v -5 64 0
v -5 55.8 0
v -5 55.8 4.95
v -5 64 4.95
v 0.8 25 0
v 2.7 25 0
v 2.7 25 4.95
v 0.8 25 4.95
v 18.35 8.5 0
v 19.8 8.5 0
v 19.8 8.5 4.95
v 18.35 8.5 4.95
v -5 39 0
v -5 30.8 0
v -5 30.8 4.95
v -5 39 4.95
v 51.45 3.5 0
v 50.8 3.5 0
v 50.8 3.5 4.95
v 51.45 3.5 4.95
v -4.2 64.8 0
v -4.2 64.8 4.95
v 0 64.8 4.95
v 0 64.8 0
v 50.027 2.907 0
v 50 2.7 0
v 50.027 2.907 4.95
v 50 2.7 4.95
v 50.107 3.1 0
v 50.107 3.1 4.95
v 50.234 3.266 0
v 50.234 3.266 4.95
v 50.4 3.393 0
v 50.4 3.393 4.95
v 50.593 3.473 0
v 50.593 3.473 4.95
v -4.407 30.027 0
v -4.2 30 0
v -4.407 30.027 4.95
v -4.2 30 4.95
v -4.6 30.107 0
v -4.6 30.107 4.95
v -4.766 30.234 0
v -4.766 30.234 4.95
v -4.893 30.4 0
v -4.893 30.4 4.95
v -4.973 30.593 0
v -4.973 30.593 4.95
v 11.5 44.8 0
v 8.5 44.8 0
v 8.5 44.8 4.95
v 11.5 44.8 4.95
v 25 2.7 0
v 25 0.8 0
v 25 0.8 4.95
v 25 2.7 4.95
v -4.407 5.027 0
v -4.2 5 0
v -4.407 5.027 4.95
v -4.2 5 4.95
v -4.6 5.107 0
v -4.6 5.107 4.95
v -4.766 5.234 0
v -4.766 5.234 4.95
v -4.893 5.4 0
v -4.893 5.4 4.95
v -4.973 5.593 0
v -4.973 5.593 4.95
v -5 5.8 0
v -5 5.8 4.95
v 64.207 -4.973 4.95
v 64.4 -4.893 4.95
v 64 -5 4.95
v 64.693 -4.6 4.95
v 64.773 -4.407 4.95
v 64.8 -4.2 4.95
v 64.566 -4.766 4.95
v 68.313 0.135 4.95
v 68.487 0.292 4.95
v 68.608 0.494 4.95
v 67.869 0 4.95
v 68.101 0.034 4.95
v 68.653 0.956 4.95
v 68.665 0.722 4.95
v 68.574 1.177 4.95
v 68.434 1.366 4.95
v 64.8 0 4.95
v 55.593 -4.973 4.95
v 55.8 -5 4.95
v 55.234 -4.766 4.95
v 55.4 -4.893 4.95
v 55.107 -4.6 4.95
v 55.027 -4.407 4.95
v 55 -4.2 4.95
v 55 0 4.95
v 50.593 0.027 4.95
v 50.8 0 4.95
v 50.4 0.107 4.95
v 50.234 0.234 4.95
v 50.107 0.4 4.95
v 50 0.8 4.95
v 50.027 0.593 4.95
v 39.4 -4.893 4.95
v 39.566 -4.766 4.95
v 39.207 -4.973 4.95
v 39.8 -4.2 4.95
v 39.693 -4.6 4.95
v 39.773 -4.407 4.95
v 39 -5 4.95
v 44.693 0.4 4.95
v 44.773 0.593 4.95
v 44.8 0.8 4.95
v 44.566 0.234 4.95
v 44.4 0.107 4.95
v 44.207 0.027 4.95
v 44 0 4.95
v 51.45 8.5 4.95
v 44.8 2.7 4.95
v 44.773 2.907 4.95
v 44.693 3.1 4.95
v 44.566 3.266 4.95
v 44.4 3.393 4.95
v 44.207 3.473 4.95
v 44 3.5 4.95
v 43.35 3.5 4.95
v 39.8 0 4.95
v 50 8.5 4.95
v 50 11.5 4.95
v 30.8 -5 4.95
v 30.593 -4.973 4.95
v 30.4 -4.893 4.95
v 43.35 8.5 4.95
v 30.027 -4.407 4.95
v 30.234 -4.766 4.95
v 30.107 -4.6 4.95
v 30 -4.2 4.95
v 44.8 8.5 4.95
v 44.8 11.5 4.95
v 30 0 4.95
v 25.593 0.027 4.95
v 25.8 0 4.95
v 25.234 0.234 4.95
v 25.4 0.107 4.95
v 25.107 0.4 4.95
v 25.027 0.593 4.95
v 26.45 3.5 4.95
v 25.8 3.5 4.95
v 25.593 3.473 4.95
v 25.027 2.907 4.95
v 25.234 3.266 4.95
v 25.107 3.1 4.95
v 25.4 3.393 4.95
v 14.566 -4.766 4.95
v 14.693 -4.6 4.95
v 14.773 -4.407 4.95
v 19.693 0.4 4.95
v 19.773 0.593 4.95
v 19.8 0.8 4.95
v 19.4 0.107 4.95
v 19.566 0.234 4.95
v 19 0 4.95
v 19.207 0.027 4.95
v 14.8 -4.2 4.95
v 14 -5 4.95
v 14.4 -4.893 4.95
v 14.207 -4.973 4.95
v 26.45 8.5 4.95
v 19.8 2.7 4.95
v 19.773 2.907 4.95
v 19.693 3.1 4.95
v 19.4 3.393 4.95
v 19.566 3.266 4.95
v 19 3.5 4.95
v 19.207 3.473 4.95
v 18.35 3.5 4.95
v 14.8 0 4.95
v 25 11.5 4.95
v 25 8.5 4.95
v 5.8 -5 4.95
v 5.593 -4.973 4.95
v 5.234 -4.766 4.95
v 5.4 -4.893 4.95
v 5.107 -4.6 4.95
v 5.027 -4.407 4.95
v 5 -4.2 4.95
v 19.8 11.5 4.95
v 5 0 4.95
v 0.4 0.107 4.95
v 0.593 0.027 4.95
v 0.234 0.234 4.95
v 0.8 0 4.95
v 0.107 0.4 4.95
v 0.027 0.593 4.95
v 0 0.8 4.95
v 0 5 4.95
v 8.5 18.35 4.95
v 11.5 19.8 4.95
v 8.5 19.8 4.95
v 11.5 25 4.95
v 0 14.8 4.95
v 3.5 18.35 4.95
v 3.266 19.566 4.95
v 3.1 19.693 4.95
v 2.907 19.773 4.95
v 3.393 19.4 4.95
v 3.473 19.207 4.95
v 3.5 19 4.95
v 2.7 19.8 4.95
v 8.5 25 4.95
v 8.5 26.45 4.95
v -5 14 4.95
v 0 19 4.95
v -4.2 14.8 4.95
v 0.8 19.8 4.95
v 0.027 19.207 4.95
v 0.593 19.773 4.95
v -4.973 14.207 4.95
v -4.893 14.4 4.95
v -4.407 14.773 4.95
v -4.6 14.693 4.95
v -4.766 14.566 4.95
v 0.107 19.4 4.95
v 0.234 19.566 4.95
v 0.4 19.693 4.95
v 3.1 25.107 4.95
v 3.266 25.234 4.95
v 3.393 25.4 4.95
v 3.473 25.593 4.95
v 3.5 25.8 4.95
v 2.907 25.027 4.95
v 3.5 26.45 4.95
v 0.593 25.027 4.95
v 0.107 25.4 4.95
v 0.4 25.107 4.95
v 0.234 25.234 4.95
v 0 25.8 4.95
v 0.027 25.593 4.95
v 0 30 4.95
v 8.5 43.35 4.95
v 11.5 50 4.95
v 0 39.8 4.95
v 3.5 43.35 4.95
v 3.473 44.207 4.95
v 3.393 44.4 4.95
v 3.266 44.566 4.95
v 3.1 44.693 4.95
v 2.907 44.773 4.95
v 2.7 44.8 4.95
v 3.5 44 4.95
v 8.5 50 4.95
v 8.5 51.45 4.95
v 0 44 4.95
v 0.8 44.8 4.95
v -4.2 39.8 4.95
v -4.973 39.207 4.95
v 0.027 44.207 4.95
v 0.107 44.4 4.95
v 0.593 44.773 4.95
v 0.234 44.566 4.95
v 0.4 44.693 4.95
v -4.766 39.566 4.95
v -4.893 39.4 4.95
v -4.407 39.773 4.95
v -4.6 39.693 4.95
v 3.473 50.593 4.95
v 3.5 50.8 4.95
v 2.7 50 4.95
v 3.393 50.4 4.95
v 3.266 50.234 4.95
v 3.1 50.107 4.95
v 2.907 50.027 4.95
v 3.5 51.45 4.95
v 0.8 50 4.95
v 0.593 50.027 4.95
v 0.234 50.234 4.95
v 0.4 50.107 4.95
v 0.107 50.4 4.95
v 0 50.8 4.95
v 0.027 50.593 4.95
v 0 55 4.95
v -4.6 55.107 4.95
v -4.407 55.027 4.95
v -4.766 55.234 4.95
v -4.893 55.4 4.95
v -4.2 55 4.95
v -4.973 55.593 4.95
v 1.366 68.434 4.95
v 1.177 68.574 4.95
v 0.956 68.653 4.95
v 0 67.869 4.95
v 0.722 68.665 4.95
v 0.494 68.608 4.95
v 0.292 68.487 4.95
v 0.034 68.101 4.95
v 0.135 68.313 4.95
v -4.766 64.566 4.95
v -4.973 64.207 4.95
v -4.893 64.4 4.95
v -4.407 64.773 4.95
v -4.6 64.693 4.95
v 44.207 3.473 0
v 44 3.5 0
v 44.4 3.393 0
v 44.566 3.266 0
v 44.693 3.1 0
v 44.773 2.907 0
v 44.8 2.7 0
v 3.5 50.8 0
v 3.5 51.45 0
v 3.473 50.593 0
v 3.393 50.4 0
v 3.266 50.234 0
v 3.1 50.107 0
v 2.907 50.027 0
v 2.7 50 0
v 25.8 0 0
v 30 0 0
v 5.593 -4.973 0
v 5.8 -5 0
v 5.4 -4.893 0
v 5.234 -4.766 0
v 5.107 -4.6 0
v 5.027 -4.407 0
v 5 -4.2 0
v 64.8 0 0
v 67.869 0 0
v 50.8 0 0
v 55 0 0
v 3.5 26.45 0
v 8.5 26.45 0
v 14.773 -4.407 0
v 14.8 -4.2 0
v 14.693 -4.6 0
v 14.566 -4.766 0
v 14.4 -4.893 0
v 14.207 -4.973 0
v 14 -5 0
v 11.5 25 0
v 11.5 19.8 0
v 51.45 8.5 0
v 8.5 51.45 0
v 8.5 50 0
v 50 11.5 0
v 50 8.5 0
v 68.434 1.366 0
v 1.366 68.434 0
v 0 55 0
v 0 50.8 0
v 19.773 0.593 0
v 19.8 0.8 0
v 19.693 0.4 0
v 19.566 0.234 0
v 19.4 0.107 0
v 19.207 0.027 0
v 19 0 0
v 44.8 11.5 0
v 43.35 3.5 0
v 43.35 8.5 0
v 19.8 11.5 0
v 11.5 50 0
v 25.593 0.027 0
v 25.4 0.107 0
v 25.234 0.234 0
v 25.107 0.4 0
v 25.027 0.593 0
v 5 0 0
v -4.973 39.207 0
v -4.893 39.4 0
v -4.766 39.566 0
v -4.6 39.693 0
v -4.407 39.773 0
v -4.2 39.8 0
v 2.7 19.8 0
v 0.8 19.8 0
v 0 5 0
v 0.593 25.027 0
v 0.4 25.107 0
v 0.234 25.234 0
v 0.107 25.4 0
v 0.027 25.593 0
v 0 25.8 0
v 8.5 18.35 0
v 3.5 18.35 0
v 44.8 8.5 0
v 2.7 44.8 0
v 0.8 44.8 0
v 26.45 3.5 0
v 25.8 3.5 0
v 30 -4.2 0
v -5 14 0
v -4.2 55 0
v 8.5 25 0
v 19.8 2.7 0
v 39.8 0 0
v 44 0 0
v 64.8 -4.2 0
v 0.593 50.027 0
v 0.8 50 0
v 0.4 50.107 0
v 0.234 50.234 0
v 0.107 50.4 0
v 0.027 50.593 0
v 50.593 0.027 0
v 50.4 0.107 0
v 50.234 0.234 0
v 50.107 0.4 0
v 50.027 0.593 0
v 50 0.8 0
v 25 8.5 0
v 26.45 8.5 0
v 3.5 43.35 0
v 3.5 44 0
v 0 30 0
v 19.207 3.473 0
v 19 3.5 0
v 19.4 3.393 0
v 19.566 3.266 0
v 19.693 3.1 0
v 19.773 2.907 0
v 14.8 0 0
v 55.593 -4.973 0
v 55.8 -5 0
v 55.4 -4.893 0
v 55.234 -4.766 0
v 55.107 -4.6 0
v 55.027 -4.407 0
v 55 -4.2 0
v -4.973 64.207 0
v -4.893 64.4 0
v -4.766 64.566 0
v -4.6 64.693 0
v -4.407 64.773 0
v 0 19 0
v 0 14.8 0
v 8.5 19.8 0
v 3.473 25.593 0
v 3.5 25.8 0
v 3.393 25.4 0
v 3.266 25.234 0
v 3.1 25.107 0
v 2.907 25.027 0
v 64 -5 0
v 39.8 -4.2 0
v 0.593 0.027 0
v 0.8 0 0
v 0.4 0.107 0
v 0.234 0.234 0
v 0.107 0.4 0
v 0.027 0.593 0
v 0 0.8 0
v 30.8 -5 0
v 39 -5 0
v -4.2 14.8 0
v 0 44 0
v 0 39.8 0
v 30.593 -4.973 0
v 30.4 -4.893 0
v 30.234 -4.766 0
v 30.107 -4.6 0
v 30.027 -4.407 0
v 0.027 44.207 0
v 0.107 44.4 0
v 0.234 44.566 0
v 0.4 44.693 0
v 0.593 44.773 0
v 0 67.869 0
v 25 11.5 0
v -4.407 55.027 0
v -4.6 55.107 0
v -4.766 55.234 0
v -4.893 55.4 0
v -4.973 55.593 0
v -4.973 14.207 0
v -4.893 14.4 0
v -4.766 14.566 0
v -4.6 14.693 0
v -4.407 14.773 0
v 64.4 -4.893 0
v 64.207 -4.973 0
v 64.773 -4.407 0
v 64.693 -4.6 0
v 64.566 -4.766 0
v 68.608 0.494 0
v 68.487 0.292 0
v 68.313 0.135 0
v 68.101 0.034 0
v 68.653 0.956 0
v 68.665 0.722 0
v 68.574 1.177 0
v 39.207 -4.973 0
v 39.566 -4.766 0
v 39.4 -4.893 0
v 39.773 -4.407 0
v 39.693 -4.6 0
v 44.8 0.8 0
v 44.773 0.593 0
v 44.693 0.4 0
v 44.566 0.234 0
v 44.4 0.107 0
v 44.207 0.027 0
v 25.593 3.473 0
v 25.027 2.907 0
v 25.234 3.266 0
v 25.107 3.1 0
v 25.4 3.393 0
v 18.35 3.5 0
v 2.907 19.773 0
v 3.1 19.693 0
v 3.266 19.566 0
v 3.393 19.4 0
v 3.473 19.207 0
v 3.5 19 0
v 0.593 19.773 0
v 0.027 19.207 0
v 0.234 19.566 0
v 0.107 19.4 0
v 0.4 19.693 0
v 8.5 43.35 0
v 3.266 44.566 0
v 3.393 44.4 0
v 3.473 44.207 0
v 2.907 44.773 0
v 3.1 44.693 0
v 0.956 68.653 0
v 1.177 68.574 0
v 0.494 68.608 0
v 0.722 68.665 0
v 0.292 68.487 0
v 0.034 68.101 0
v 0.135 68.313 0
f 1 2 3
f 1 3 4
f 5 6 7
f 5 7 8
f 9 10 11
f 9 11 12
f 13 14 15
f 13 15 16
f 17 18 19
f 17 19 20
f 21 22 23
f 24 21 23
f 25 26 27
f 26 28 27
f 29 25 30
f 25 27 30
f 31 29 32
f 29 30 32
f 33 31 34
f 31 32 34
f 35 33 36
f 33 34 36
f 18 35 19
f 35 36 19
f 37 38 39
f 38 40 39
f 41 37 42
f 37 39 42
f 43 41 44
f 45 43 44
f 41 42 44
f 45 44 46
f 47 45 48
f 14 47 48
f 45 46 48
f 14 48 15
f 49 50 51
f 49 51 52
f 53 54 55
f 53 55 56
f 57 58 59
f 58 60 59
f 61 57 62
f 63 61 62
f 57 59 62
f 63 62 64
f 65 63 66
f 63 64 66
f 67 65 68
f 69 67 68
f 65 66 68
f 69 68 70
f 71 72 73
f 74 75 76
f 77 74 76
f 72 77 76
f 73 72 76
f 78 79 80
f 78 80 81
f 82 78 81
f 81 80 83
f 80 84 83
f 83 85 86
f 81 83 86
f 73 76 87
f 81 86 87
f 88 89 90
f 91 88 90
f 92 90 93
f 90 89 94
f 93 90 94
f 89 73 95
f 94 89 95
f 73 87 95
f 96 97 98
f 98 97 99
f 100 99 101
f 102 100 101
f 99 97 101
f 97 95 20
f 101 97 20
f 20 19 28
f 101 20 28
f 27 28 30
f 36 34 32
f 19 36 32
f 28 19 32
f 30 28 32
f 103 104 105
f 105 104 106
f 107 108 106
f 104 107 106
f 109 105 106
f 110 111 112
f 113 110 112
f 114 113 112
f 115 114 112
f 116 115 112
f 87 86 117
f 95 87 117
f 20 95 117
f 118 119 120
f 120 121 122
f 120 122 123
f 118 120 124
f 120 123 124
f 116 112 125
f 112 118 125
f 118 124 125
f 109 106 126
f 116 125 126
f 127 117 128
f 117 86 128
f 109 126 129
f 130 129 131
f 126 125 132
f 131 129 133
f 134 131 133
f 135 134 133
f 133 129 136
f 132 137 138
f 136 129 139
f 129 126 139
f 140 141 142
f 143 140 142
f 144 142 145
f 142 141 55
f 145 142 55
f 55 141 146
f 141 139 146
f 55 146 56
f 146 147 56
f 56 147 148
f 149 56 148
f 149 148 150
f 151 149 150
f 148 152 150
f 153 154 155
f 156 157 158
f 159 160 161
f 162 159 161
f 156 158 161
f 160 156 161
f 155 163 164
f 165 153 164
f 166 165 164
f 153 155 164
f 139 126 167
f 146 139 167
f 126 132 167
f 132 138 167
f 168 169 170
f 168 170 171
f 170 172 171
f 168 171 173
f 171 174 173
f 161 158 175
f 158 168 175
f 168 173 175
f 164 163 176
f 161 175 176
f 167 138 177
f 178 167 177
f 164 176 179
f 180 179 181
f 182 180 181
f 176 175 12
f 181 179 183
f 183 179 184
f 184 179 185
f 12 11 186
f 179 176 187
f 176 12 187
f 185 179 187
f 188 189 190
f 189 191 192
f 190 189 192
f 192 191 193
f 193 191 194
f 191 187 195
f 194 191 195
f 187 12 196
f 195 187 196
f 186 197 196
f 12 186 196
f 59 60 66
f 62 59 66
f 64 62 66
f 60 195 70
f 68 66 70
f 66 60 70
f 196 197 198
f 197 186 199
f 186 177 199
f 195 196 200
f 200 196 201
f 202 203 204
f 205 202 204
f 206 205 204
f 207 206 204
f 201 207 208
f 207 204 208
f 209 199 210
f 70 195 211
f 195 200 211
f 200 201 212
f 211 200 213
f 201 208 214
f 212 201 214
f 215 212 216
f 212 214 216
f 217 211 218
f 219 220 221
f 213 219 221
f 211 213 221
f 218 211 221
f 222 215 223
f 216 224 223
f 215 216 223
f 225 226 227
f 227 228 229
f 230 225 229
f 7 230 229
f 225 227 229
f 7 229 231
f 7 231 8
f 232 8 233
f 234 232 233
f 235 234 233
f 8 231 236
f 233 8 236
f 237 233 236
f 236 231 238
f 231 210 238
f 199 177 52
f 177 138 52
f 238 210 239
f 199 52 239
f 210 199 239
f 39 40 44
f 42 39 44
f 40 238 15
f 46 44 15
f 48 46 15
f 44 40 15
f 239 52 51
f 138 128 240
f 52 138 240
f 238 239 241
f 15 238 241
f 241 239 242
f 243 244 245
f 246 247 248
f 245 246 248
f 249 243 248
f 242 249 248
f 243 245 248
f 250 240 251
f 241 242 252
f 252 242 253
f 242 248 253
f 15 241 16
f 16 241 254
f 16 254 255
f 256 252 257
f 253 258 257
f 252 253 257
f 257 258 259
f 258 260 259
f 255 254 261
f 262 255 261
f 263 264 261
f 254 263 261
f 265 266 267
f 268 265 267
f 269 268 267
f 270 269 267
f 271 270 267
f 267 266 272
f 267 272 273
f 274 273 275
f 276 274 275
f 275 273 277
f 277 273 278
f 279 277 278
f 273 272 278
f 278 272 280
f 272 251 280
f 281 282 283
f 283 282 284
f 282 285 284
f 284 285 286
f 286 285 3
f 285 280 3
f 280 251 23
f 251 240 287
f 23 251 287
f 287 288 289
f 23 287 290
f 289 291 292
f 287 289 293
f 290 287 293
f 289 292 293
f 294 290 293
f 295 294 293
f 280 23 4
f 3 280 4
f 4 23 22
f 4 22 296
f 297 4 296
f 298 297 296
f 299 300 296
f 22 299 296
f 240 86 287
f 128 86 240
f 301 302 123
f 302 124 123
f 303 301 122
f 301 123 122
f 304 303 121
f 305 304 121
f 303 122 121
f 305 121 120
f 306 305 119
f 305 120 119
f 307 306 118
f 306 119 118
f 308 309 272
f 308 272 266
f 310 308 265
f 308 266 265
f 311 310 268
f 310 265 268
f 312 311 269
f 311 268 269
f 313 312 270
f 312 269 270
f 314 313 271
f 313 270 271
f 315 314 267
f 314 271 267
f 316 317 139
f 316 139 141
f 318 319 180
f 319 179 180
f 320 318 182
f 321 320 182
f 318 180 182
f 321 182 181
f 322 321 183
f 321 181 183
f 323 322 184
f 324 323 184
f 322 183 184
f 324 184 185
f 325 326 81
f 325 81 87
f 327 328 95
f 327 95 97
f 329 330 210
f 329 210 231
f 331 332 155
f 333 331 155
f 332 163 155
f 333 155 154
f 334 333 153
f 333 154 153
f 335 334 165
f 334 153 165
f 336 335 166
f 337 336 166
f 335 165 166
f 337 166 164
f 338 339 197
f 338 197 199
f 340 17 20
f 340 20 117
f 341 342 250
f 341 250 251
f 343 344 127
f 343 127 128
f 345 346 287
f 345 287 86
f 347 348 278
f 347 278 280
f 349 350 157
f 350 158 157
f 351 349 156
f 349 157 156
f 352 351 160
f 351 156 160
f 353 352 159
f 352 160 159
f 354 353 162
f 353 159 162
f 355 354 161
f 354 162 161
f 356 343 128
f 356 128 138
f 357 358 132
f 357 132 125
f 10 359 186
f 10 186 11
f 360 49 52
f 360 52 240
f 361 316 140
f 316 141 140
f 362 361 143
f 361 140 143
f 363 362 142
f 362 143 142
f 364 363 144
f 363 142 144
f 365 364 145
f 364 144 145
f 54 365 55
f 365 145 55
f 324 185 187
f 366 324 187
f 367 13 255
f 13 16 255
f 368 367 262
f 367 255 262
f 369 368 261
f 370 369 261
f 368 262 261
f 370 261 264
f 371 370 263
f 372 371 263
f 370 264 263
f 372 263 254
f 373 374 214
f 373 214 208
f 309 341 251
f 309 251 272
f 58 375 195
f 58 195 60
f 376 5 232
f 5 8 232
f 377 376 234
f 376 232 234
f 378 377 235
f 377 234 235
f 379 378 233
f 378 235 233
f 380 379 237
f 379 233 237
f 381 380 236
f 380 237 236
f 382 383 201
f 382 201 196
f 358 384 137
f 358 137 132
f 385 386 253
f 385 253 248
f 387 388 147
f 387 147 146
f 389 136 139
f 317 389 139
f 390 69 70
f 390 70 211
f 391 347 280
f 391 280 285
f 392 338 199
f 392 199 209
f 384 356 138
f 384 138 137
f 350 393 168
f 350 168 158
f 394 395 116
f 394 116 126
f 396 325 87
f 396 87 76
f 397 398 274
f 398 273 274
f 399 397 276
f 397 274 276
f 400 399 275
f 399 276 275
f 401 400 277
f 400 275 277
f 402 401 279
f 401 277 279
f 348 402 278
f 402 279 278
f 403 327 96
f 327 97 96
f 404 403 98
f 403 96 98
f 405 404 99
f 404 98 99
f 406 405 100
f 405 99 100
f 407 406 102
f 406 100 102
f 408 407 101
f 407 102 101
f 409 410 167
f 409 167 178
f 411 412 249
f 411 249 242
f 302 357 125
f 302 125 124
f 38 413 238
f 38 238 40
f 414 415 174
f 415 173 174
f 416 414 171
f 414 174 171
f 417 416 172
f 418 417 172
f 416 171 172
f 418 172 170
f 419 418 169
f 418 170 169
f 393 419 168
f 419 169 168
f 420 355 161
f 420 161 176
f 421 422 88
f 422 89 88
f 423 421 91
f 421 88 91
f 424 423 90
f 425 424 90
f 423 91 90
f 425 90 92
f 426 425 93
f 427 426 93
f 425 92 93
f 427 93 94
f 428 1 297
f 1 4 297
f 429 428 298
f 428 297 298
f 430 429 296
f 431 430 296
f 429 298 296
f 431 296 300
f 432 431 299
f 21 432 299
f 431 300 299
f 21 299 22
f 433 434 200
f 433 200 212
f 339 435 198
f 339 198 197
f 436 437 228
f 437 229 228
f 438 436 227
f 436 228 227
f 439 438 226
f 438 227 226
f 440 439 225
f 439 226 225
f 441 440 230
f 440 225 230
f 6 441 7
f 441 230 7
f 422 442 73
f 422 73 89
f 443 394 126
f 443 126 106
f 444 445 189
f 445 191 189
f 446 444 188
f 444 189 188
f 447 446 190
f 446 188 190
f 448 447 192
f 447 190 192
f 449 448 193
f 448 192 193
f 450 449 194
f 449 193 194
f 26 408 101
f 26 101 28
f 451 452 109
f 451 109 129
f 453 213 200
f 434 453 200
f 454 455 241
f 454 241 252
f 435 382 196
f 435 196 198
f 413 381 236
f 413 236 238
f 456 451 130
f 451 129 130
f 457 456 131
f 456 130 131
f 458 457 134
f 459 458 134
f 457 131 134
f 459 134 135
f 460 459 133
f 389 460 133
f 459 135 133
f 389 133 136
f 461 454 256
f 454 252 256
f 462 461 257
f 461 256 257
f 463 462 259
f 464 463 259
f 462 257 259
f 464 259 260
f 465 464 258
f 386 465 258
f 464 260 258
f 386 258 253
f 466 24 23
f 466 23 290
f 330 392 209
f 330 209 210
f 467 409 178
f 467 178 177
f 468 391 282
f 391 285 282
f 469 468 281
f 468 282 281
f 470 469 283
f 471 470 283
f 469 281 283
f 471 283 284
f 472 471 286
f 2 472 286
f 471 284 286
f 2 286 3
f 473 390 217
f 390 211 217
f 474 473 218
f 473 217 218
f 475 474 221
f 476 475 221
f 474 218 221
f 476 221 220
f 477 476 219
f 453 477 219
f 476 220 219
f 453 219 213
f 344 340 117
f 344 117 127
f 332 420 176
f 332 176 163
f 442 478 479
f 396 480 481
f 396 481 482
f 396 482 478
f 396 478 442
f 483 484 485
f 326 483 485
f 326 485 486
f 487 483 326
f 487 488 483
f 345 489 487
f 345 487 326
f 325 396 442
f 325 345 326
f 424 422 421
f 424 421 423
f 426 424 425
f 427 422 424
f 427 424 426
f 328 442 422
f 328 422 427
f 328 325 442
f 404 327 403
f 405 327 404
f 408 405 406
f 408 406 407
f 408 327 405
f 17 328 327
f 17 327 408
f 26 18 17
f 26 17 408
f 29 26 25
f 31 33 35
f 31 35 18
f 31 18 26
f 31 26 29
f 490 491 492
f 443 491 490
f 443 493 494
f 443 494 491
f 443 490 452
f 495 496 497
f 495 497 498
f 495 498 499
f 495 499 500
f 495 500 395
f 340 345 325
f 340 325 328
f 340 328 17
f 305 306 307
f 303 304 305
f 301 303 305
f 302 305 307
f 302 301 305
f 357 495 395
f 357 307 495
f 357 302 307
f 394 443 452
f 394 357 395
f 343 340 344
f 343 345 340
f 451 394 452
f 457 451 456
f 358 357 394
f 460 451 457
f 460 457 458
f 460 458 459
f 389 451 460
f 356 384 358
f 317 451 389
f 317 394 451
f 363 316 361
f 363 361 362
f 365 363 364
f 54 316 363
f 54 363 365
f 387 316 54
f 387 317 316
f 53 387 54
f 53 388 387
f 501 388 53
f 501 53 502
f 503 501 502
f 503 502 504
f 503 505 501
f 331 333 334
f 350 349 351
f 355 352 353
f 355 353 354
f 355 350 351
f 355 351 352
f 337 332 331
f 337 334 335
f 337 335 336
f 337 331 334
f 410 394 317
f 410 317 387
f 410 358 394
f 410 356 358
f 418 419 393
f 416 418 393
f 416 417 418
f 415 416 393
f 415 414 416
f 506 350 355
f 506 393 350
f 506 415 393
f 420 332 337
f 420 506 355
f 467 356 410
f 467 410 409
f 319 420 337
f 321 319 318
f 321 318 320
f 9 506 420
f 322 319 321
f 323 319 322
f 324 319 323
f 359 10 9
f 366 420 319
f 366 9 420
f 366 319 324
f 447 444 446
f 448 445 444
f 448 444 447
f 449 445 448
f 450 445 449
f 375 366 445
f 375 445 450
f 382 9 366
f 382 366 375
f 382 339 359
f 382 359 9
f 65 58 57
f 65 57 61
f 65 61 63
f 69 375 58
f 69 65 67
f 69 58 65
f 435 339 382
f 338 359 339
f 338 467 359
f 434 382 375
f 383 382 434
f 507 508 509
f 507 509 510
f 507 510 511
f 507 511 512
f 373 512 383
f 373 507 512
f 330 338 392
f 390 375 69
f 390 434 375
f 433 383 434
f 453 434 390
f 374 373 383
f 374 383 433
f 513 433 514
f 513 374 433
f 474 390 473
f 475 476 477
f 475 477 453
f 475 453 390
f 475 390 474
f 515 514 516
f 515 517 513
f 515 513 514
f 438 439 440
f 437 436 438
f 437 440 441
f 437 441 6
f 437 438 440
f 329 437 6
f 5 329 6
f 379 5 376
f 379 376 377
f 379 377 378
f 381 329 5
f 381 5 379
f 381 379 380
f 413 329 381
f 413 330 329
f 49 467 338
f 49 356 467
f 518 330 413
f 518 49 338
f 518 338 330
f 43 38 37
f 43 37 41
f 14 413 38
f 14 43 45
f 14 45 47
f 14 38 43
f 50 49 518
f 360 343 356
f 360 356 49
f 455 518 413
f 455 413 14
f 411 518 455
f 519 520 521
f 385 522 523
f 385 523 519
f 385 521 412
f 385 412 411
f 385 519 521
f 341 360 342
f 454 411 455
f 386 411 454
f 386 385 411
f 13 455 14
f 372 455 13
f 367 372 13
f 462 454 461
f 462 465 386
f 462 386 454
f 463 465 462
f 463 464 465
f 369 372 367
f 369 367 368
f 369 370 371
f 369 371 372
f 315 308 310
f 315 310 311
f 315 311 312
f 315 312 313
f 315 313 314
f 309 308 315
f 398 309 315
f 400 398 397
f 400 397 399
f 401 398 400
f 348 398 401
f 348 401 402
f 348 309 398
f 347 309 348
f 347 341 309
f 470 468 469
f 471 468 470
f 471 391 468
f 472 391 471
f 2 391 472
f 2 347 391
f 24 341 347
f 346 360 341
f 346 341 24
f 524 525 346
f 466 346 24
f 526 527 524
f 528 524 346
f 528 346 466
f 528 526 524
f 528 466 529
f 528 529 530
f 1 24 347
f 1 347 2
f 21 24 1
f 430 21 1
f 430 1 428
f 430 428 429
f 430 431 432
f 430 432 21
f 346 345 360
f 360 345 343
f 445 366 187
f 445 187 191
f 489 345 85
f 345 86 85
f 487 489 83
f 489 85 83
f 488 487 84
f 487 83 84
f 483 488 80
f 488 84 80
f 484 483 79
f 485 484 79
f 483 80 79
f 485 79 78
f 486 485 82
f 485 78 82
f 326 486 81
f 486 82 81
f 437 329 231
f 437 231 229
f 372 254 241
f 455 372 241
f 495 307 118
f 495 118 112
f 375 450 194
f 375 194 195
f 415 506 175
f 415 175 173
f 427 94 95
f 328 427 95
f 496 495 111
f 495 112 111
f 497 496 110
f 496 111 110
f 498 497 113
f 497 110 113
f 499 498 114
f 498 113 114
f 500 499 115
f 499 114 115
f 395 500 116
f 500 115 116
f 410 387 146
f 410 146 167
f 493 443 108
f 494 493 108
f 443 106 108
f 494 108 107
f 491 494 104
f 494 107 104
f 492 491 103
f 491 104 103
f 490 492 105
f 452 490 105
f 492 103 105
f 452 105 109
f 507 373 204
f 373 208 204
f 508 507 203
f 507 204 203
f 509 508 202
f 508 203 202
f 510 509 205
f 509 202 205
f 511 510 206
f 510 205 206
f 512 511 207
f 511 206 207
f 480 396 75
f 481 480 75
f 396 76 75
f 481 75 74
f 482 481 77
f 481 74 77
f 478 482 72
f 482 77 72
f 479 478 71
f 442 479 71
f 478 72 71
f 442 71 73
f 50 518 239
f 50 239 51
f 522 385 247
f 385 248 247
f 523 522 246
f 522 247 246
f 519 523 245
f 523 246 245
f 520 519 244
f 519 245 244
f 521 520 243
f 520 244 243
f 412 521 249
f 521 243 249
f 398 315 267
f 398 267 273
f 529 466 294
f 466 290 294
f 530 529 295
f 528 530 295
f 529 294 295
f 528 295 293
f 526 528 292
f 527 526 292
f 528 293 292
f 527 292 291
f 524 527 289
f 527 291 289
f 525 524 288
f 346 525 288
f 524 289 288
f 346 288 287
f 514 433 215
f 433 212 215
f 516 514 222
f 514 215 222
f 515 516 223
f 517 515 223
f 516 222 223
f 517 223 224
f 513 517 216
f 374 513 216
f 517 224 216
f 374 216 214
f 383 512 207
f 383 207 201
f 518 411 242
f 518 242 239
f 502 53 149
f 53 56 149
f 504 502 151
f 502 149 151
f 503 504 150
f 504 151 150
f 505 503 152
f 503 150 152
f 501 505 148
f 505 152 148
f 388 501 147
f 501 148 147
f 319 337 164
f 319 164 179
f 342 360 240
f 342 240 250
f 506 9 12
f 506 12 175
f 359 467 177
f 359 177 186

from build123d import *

# Parameters (mm, degrees)
BOSS_EXTRUDE1_DEPTH = 4.95
FILLET1_R           = 0.8


with BuildPart() as part:
    # Sketch2 → Boss-Extrude1 (new body)
    with BuildSketch(Plane.XY):
        Polygon((11.5, 25), (8.5, 25), (8.5, 26.45), (3.5, 26.45), (3.5, 25), (0, 25), (0, 30), (-5, 30), (-5, 39.8), (0, 39.8), (0, 44.8), (3.5, 44.8), (3.5, 43.35), (8.5, 43.35), (8.5, 44.8), (11.5, 44.8), (11.5, 50), (8.5, 50), (8.5, 51.45), (3.5, 51.45), (3.5, 50), (0, 50), (0, 55), (-5, 55), (-5, 64.8), (0, 64.8), (0, 69.8), (69.8, 0), (64.8, 0), (64.8, -5), (55, -5), (55, 0), (50, 0), (50, 3.5), (51.45, 3.5), (51.45, 8.5), (50, 8.5), (50, 11.5), (44.8, 11.5), (44.8, 8.5), (43.35, 8.5), (43.35, 3.5), (44.8, 3.5), (44.8, 0), (39.8, 0), (39.8, -5), (30, -5), (30, 0), (25, 0), (25, 3.5), (26.45, 3.5), (26.45, 8.5), (25, 8.5), (25, 11.5), (19.8, 11.5), (19.8, 8.5), (18.35, 8.5), (18.35, 3.5), (19.8, 3.5), (19.8, 0), (14.8, 0), (14.8, -5), (5, -5), (5, 0), (0, 0), (0, 5), (-5, 5), (-5, 14.8), (0, 14.8), (0, 19.8), (3.5, 19.8), (3.5, 18.35), (8.5, 18.35), (8.5, 19.8), (11.5, 19.8), align=None)
    extrude(amount=BOSS_EXTRUDE1_DEPTH)

    # Fillet1
    fillet1_edges = [part.edges().sort_by_distance(p)[0] for p in [
        (19.8, 3.5, 2.475),
        (19.8, 0, 2.475),
        (14.8, -5, 2.475),
        (5, -5, 2.475),
        (0, 0, 2.475),
        (-5, 5, 2.475),
        (-5, 14.8, 2.475),
        (0, 19.8, 2.475),
        (3.5, 19.8, 2.475),
        (3.5, 25, 2.475),
        (0, 25, 2.475),
        (-5, 30, 2.475),
        (-5, 39.8, 2.475),
        (0, 44.8, 2.475),
        (3.5, 44.8, 2.475),
        (3.5, 50, 2.475),
        (0, 50, 2.475),
        (-5, 55, 2.475),
        (-5, 64.8, 2.475),
        (0, 69.8, 2.475),
        (69.8, 0, 2.475),
        (64.8, -5, 2.475),
        (55, -5, 2.475),
        (50, 0, 2.475),
        (50, 3.5, 2.475),
        (44.8, 3.5, 2.475),
        (44.8, 0, 2.475),
        (39.8, -5, 2.475),
        (30, -5, 2.475),
        (25, 0, 2.475),
        (25, 3.5, 2.475),
    ]]
    fillet(fillet1_edges, radius=FILLET1_R)


solid = part.part
